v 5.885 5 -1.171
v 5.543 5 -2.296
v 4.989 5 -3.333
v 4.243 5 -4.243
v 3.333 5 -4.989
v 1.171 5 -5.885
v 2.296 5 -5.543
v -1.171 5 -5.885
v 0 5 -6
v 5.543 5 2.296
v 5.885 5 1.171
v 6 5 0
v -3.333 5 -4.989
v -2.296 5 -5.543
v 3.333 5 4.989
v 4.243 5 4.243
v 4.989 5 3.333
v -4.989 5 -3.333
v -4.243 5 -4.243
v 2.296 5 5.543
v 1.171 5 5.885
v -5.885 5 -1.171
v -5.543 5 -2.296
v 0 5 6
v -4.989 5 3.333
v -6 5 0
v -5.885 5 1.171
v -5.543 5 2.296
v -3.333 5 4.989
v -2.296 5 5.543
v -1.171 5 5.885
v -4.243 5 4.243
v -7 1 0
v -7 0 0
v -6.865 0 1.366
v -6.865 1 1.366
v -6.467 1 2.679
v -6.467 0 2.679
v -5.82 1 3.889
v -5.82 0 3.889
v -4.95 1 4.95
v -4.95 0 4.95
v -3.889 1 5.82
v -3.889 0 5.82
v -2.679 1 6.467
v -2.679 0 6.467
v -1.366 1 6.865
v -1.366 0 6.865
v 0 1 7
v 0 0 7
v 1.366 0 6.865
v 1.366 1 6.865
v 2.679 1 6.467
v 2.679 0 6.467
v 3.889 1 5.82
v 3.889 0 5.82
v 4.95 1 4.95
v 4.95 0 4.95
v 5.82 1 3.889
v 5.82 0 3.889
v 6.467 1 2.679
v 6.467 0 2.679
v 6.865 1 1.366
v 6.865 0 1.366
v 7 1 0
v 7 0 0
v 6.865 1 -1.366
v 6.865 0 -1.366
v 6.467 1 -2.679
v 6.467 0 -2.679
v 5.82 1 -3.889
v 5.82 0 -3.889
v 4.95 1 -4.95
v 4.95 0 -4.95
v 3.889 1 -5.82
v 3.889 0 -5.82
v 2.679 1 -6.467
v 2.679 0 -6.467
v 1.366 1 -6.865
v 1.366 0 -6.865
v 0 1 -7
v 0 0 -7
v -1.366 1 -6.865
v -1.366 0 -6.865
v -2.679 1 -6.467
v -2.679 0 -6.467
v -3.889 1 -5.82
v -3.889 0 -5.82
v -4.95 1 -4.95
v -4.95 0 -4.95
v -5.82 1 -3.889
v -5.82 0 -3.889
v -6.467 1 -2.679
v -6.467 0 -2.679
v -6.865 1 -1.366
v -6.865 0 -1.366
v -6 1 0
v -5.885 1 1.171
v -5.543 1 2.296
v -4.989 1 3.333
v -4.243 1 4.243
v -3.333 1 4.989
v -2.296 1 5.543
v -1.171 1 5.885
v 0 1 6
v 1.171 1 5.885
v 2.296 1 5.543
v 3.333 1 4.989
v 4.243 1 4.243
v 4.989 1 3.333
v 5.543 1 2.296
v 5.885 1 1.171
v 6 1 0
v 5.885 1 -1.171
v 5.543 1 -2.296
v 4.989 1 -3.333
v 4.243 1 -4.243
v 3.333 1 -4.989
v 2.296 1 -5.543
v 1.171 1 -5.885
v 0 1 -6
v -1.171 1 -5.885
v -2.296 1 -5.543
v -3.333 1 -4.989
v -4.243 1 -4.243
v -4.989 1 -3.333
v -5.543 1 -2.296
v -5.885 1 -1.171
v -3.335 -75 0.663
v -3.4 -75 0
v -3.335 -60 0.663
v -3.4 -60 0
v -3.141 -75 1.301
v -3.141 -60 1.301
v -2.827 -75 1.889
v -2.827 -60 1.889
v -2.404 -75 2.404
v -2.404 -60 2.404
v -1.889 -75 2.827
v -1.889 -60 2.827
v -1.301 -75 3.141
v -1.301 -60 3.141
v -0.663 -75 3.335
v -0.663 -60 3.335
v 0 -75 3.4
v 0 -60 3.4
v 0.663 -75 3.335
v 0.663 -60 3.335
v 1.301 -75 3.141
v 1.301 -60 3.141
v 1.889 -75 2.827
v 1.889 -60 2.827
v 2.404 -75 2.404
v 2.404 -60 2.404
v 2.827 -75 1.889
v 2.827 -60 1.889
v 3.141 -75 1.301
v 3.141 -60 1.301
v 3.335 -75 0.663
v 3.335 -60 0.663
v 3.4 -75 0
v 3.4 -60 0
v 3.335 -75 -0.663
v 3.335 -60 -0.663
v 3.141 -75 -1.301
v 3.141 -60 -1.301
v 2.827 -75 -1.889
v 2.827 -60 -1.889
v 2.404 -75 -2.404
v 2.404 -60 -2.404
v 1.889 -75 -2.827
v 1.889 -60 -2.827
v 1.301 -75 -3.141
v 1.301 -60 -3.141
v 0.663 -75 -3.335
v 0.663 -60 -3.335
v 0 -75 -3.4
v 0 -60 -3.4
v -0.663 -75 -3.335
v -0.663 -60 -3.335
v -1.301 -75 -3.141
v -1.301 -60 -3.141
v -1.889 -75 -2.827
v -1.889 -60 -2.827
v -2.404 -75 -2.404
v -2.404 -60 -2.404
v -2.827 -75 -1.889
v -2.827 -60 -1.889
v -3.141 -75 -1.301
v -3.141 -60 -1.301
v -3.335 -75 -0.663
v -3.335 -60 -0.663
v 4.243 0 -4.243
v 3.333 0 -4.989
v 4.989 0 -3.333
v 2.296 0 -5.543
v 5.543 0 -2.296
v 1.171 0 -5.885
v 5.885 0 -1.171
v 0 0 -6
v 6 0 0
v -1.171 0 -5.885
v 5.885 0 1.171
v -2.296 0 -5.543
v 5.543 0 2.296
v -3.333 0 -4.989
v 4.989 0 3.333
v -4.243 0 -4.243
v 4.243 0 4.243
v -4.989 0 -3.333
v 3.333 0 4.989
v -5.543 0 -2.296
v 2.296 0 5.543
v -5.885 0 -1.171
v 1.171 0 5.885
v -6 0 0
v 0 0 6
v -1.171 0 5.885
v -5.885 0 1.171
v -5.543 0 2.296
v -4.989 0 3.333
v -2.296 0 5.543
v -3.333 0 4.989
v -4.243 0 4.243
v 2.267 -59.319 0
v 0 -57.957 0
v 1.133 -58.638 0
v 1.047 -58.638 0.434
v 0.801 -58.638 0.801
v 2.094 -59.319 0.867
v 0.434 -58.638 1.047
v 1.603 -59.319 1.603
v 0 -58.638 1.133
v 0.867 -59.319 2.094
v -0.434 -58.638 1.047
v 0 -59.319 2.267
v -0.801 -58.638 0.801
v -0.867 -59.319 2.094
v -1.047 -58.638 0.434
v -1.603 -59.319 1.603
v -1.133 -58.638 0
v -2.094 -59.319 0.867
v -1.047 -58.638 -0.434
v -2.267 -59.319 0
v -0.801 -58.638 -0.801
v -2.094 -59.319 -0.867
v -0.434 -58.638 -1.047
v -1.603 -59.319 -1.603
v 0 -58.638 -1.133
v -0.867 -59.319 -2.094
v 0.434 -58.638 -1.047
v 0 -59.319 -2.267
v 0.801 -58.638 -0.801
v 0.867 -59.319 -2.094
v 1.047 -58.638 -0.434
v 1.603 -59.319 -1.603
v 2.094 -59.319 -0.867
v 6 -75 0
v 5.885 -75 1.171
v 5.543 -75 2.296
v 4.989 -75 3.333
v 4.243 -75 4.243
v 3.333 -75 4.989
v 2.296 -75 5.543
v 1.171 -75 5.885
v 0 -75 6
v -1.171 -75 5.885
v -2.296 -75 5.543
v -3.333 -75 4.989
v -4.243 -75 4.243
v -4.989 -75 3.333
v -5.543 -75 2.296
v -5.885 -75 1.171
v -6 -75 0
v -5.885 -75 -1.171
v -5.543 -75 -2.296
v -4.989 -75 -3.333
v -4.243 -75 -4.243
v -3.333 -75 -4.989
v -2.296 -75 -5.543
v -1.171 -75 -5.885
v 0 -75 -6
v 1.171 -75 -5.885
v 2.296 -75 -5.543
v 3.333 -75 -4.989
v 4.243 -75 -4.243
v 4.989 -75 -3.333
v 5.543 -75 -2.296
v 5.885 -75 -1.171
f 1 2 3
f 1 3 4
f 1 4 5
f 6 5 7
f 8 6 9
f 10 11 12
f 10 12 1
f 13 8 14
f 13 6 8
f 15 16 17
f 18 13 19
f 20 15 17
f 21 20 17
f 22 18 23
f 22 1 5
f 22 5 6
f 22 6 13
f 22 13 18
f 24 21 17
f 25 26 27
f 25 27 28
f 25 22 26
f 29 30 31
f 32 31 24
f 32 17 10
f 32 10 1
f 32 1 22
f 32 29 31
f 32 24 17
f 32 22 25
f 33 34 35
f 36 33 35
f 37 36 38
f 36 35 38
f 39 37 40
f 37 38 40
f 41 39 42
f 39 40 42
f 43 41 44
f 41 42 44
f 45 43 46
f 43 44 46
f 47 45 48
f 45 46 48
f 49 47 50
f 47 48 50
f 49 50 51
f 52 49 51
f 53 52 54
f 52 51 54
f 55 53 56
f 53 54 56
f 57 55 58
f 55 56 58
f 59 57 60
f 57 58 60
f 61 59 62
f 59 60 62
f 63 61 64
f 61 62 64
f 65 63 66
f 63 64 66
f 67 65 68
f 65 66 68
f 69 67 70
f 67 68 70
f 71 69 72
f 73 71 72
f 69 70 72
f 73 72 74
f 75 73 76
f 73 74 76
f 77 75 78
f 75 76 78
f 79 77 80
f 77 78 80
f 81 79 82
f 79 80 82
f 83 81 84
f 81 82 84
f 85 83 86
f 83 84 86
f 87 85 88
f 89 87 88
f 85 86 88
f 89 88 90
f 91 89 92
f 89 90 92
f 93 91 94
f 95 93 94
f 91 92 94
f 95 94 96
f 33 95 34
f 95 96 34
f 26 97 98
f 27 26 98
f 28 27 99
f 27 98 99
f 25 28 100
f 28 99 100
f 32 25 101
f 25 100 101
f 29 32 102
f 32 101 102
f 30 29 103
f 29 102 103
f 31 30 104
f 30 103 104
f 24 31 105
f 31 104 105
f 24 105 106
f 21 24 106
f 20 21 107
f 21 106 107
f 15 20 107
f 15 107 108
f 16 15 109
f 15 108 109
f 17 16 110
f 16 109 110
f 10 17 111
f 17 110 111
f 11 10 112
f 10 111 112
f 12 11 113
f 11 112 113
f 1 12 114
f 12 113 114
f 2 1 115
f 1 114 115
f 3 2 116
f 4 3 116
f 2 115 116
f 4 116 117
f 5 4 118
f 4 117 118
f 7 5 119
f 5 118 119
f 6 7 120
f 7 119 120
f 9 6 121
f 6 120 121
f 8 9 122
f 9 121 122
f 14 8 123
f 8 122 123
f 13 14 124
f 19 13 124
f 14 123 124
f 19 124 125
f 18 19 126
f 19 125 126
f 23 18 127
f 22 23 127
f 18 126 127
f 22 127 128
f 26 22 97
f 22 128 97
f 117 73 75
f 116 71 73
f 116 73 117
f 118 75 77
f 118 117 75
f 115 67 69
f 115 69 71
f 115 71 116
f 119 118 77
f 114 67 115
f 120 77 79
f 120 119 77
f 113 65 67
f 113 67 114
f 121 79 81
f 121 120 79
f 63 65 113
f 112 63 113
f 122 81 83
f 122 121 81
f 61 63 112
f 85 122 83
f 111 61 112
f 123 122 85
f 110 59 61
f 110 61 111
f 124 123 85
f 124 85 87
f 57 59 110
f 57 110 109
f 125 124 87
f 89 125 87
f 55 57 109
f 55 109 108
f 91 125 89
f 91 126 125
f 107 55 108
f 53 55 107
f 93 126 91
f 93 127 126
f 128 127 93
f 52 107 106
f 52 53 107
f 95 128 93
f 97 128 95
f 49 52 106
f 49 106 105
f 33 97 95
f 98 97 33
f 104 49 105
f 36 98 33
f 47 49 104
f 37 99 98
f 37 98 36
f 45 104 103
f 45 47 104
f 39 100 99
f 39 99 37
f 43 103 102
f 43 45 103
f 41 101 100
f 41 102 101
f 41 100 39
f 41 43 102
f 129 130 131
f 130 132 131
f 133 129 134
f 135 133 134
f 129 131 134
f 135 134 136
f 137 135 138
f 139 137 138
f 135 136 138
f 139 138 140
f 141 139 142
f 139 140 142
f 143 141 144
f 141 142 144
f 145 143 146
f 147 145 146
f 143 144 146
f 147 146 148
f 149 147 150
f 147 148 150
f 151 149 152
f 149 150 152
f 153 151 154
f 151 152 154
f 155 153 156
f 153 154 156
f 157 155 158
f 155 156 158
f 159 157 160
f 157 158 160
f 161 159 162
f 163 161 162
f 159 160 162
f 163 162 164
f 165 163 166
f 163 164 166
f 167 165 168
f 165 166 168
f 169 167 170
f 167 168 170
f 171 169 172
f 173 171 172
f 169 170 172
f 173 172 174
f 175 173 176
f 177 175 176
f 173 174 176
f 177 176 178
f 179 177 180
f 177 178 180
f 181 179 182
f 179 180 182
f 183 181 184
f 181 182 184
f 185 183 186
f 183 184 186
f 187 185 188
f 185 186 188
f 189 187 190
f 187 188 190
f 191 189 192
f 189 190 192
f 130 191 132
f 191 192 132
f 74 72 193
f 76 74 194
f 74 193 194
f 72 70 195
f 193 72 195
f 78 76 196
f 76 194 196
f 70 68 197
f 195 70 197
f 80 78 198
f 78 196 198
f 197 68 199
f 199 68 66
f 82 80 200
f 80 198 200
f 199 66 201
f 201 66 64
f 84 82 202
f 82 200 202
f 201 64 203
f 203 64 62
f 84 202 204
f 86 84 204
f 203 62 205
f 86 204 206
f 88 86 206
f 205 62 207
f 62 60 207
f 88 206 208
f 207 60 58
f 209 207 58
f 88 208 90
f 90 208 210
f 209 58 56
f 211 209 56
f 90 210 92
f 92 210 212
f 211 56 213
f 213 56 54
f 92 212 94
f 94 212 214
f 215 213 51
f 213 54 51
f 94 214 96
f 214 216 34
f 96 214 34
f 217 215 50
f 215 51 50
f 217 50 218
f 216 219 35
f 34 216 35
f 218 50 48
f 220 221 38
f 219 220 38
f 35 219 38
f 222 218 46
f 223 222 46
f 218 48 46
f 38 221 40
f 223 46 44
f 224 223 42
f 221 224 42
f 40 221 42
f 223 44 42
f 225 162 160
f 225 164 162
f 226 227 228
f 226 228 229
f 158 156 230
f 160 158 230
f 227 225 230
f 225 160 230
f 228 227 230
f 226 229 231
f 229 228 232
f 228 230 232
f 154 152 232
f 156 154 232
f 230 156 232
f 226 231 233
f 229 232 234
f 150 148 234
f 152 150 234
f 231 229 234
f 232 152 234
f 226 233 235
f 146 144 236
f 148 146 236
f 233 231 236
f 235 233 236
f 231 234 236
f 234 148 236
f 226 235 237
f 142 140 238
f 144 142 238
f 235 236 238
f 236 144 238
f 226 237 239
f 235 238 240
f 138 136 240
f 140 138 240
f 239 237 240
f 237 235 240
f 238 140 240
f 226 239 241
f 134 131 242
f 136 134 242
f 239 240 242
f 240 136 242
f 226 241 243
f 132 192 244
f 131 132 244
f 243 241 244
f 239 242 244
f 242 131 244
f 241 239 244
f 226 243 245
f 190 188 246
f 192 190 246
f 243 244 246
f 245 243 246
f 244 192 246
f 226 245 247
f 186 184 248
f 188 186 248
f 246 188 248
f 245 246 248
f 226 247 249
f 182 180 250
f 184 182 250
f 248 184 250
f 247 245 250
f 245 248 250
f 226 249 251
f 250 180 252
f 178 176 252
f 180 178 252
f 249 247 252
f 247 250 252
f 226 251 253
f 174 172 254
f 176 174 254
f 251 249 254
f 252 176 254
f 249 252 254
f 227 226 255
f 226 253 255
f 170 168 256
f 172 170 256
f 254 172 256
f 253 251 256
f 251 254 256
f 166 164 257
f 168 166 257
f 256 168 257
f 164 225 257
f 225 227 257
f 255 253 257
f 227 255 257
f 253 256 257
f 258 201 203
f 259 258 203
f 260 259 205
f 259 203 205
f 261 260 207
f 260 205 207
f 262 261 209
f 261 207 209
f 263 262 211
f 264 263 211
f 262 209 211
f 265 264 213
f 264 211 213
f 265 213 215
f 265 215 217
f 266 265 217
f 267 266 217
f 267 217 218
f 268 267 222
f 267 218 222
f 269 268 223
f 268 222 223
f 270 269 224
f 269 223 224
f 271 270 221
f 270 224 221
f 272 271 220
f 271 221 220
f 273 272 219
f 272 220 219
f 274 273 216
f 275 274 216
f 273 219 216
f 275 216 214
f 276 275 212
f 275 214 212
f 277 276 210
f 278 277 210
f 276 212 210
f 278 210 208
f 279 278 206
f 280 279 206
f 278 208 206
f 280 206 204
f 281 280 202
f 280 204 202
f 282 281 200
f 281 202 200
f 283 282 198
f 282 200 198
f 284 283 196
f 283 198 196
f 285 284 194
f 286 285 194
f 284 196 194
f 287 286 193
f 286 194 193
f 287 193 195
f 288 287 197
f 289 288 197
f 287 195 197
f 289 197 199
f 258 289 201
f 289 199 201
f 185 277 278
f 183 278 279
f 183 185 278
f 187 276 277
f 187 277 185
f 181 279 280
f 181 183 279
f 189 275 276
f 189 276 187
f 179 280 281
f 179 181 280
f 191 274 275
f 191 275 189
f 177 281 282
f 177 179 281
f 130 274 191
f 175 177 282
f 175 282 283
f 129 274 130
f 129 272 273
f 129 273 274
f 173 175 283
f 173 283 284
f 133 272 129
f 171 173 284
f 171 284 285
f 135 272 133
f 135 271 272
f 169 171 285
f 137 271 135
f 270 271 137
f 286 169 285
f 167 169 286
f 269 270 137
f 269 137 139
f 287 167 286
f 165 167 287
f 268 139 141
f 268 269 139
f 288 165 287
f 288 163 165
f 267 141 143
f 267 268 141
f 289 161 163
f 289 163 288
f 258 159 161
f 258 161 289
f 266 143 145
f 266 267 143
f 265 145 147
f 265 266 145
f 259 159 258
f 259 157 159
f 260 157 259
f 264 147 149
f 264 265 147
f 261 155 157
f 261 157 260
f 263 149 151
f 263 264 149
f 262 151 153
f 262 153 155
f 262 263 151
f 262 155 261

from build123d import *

# Parameters (mm, degrees)
F0_R     = 6
F1_DEPTH = 75
F2_R     = 7
F2_R_2   = 6
F3_DEPTH = 1
F4_R     = 6
F5_DEPTH = 4
F7_D     = 6.8
F7_DEPTH = 15
F7_TIP   = 2.0429261047


with BuildPart() as f1:
    # F0 (on Front) → F1 (new body)
    with BuildSketch(Plane.XZ):
        Circle(F0_R)
    extrude(amount=F1_DEPTH)

    # F2 (on face) → F3 (join)
    with BuildSketch(Plane(origin=(0, 0, 0), x_dir=(-1, 0, 0), z_dir=(0, 1, 0))):
        Circle(F2_R)
        Circle(F2_R_2, mode=Mode.SUBTRACT)
        Circle(F2_R_2)
    extrude(amount=F3_DEPTH)

    # F4 (on face) → F5 (join)
    with BuildSketch(Plane(origin=(0, 1, 0), x_dir=(-1, 0, 0), z_dir=(0, 1, 0))):
        Circle(F4_R)
    extrude(amount=F5_DEPTH)

    # F7
    with Locations(Plane.XZ.offset(75)):
        with Locations((0, 0)):
            Hole(F7_D / 2, depth=F7_DEPTH)
            with Locations((0, 0, -(F7_DEPTH + F7_TIP / 2))):  # 118° drill point
                Cone(0, F7_D / 2, F7_TIP, mode=Mode.SUBTRACT)


solid = f1.part
